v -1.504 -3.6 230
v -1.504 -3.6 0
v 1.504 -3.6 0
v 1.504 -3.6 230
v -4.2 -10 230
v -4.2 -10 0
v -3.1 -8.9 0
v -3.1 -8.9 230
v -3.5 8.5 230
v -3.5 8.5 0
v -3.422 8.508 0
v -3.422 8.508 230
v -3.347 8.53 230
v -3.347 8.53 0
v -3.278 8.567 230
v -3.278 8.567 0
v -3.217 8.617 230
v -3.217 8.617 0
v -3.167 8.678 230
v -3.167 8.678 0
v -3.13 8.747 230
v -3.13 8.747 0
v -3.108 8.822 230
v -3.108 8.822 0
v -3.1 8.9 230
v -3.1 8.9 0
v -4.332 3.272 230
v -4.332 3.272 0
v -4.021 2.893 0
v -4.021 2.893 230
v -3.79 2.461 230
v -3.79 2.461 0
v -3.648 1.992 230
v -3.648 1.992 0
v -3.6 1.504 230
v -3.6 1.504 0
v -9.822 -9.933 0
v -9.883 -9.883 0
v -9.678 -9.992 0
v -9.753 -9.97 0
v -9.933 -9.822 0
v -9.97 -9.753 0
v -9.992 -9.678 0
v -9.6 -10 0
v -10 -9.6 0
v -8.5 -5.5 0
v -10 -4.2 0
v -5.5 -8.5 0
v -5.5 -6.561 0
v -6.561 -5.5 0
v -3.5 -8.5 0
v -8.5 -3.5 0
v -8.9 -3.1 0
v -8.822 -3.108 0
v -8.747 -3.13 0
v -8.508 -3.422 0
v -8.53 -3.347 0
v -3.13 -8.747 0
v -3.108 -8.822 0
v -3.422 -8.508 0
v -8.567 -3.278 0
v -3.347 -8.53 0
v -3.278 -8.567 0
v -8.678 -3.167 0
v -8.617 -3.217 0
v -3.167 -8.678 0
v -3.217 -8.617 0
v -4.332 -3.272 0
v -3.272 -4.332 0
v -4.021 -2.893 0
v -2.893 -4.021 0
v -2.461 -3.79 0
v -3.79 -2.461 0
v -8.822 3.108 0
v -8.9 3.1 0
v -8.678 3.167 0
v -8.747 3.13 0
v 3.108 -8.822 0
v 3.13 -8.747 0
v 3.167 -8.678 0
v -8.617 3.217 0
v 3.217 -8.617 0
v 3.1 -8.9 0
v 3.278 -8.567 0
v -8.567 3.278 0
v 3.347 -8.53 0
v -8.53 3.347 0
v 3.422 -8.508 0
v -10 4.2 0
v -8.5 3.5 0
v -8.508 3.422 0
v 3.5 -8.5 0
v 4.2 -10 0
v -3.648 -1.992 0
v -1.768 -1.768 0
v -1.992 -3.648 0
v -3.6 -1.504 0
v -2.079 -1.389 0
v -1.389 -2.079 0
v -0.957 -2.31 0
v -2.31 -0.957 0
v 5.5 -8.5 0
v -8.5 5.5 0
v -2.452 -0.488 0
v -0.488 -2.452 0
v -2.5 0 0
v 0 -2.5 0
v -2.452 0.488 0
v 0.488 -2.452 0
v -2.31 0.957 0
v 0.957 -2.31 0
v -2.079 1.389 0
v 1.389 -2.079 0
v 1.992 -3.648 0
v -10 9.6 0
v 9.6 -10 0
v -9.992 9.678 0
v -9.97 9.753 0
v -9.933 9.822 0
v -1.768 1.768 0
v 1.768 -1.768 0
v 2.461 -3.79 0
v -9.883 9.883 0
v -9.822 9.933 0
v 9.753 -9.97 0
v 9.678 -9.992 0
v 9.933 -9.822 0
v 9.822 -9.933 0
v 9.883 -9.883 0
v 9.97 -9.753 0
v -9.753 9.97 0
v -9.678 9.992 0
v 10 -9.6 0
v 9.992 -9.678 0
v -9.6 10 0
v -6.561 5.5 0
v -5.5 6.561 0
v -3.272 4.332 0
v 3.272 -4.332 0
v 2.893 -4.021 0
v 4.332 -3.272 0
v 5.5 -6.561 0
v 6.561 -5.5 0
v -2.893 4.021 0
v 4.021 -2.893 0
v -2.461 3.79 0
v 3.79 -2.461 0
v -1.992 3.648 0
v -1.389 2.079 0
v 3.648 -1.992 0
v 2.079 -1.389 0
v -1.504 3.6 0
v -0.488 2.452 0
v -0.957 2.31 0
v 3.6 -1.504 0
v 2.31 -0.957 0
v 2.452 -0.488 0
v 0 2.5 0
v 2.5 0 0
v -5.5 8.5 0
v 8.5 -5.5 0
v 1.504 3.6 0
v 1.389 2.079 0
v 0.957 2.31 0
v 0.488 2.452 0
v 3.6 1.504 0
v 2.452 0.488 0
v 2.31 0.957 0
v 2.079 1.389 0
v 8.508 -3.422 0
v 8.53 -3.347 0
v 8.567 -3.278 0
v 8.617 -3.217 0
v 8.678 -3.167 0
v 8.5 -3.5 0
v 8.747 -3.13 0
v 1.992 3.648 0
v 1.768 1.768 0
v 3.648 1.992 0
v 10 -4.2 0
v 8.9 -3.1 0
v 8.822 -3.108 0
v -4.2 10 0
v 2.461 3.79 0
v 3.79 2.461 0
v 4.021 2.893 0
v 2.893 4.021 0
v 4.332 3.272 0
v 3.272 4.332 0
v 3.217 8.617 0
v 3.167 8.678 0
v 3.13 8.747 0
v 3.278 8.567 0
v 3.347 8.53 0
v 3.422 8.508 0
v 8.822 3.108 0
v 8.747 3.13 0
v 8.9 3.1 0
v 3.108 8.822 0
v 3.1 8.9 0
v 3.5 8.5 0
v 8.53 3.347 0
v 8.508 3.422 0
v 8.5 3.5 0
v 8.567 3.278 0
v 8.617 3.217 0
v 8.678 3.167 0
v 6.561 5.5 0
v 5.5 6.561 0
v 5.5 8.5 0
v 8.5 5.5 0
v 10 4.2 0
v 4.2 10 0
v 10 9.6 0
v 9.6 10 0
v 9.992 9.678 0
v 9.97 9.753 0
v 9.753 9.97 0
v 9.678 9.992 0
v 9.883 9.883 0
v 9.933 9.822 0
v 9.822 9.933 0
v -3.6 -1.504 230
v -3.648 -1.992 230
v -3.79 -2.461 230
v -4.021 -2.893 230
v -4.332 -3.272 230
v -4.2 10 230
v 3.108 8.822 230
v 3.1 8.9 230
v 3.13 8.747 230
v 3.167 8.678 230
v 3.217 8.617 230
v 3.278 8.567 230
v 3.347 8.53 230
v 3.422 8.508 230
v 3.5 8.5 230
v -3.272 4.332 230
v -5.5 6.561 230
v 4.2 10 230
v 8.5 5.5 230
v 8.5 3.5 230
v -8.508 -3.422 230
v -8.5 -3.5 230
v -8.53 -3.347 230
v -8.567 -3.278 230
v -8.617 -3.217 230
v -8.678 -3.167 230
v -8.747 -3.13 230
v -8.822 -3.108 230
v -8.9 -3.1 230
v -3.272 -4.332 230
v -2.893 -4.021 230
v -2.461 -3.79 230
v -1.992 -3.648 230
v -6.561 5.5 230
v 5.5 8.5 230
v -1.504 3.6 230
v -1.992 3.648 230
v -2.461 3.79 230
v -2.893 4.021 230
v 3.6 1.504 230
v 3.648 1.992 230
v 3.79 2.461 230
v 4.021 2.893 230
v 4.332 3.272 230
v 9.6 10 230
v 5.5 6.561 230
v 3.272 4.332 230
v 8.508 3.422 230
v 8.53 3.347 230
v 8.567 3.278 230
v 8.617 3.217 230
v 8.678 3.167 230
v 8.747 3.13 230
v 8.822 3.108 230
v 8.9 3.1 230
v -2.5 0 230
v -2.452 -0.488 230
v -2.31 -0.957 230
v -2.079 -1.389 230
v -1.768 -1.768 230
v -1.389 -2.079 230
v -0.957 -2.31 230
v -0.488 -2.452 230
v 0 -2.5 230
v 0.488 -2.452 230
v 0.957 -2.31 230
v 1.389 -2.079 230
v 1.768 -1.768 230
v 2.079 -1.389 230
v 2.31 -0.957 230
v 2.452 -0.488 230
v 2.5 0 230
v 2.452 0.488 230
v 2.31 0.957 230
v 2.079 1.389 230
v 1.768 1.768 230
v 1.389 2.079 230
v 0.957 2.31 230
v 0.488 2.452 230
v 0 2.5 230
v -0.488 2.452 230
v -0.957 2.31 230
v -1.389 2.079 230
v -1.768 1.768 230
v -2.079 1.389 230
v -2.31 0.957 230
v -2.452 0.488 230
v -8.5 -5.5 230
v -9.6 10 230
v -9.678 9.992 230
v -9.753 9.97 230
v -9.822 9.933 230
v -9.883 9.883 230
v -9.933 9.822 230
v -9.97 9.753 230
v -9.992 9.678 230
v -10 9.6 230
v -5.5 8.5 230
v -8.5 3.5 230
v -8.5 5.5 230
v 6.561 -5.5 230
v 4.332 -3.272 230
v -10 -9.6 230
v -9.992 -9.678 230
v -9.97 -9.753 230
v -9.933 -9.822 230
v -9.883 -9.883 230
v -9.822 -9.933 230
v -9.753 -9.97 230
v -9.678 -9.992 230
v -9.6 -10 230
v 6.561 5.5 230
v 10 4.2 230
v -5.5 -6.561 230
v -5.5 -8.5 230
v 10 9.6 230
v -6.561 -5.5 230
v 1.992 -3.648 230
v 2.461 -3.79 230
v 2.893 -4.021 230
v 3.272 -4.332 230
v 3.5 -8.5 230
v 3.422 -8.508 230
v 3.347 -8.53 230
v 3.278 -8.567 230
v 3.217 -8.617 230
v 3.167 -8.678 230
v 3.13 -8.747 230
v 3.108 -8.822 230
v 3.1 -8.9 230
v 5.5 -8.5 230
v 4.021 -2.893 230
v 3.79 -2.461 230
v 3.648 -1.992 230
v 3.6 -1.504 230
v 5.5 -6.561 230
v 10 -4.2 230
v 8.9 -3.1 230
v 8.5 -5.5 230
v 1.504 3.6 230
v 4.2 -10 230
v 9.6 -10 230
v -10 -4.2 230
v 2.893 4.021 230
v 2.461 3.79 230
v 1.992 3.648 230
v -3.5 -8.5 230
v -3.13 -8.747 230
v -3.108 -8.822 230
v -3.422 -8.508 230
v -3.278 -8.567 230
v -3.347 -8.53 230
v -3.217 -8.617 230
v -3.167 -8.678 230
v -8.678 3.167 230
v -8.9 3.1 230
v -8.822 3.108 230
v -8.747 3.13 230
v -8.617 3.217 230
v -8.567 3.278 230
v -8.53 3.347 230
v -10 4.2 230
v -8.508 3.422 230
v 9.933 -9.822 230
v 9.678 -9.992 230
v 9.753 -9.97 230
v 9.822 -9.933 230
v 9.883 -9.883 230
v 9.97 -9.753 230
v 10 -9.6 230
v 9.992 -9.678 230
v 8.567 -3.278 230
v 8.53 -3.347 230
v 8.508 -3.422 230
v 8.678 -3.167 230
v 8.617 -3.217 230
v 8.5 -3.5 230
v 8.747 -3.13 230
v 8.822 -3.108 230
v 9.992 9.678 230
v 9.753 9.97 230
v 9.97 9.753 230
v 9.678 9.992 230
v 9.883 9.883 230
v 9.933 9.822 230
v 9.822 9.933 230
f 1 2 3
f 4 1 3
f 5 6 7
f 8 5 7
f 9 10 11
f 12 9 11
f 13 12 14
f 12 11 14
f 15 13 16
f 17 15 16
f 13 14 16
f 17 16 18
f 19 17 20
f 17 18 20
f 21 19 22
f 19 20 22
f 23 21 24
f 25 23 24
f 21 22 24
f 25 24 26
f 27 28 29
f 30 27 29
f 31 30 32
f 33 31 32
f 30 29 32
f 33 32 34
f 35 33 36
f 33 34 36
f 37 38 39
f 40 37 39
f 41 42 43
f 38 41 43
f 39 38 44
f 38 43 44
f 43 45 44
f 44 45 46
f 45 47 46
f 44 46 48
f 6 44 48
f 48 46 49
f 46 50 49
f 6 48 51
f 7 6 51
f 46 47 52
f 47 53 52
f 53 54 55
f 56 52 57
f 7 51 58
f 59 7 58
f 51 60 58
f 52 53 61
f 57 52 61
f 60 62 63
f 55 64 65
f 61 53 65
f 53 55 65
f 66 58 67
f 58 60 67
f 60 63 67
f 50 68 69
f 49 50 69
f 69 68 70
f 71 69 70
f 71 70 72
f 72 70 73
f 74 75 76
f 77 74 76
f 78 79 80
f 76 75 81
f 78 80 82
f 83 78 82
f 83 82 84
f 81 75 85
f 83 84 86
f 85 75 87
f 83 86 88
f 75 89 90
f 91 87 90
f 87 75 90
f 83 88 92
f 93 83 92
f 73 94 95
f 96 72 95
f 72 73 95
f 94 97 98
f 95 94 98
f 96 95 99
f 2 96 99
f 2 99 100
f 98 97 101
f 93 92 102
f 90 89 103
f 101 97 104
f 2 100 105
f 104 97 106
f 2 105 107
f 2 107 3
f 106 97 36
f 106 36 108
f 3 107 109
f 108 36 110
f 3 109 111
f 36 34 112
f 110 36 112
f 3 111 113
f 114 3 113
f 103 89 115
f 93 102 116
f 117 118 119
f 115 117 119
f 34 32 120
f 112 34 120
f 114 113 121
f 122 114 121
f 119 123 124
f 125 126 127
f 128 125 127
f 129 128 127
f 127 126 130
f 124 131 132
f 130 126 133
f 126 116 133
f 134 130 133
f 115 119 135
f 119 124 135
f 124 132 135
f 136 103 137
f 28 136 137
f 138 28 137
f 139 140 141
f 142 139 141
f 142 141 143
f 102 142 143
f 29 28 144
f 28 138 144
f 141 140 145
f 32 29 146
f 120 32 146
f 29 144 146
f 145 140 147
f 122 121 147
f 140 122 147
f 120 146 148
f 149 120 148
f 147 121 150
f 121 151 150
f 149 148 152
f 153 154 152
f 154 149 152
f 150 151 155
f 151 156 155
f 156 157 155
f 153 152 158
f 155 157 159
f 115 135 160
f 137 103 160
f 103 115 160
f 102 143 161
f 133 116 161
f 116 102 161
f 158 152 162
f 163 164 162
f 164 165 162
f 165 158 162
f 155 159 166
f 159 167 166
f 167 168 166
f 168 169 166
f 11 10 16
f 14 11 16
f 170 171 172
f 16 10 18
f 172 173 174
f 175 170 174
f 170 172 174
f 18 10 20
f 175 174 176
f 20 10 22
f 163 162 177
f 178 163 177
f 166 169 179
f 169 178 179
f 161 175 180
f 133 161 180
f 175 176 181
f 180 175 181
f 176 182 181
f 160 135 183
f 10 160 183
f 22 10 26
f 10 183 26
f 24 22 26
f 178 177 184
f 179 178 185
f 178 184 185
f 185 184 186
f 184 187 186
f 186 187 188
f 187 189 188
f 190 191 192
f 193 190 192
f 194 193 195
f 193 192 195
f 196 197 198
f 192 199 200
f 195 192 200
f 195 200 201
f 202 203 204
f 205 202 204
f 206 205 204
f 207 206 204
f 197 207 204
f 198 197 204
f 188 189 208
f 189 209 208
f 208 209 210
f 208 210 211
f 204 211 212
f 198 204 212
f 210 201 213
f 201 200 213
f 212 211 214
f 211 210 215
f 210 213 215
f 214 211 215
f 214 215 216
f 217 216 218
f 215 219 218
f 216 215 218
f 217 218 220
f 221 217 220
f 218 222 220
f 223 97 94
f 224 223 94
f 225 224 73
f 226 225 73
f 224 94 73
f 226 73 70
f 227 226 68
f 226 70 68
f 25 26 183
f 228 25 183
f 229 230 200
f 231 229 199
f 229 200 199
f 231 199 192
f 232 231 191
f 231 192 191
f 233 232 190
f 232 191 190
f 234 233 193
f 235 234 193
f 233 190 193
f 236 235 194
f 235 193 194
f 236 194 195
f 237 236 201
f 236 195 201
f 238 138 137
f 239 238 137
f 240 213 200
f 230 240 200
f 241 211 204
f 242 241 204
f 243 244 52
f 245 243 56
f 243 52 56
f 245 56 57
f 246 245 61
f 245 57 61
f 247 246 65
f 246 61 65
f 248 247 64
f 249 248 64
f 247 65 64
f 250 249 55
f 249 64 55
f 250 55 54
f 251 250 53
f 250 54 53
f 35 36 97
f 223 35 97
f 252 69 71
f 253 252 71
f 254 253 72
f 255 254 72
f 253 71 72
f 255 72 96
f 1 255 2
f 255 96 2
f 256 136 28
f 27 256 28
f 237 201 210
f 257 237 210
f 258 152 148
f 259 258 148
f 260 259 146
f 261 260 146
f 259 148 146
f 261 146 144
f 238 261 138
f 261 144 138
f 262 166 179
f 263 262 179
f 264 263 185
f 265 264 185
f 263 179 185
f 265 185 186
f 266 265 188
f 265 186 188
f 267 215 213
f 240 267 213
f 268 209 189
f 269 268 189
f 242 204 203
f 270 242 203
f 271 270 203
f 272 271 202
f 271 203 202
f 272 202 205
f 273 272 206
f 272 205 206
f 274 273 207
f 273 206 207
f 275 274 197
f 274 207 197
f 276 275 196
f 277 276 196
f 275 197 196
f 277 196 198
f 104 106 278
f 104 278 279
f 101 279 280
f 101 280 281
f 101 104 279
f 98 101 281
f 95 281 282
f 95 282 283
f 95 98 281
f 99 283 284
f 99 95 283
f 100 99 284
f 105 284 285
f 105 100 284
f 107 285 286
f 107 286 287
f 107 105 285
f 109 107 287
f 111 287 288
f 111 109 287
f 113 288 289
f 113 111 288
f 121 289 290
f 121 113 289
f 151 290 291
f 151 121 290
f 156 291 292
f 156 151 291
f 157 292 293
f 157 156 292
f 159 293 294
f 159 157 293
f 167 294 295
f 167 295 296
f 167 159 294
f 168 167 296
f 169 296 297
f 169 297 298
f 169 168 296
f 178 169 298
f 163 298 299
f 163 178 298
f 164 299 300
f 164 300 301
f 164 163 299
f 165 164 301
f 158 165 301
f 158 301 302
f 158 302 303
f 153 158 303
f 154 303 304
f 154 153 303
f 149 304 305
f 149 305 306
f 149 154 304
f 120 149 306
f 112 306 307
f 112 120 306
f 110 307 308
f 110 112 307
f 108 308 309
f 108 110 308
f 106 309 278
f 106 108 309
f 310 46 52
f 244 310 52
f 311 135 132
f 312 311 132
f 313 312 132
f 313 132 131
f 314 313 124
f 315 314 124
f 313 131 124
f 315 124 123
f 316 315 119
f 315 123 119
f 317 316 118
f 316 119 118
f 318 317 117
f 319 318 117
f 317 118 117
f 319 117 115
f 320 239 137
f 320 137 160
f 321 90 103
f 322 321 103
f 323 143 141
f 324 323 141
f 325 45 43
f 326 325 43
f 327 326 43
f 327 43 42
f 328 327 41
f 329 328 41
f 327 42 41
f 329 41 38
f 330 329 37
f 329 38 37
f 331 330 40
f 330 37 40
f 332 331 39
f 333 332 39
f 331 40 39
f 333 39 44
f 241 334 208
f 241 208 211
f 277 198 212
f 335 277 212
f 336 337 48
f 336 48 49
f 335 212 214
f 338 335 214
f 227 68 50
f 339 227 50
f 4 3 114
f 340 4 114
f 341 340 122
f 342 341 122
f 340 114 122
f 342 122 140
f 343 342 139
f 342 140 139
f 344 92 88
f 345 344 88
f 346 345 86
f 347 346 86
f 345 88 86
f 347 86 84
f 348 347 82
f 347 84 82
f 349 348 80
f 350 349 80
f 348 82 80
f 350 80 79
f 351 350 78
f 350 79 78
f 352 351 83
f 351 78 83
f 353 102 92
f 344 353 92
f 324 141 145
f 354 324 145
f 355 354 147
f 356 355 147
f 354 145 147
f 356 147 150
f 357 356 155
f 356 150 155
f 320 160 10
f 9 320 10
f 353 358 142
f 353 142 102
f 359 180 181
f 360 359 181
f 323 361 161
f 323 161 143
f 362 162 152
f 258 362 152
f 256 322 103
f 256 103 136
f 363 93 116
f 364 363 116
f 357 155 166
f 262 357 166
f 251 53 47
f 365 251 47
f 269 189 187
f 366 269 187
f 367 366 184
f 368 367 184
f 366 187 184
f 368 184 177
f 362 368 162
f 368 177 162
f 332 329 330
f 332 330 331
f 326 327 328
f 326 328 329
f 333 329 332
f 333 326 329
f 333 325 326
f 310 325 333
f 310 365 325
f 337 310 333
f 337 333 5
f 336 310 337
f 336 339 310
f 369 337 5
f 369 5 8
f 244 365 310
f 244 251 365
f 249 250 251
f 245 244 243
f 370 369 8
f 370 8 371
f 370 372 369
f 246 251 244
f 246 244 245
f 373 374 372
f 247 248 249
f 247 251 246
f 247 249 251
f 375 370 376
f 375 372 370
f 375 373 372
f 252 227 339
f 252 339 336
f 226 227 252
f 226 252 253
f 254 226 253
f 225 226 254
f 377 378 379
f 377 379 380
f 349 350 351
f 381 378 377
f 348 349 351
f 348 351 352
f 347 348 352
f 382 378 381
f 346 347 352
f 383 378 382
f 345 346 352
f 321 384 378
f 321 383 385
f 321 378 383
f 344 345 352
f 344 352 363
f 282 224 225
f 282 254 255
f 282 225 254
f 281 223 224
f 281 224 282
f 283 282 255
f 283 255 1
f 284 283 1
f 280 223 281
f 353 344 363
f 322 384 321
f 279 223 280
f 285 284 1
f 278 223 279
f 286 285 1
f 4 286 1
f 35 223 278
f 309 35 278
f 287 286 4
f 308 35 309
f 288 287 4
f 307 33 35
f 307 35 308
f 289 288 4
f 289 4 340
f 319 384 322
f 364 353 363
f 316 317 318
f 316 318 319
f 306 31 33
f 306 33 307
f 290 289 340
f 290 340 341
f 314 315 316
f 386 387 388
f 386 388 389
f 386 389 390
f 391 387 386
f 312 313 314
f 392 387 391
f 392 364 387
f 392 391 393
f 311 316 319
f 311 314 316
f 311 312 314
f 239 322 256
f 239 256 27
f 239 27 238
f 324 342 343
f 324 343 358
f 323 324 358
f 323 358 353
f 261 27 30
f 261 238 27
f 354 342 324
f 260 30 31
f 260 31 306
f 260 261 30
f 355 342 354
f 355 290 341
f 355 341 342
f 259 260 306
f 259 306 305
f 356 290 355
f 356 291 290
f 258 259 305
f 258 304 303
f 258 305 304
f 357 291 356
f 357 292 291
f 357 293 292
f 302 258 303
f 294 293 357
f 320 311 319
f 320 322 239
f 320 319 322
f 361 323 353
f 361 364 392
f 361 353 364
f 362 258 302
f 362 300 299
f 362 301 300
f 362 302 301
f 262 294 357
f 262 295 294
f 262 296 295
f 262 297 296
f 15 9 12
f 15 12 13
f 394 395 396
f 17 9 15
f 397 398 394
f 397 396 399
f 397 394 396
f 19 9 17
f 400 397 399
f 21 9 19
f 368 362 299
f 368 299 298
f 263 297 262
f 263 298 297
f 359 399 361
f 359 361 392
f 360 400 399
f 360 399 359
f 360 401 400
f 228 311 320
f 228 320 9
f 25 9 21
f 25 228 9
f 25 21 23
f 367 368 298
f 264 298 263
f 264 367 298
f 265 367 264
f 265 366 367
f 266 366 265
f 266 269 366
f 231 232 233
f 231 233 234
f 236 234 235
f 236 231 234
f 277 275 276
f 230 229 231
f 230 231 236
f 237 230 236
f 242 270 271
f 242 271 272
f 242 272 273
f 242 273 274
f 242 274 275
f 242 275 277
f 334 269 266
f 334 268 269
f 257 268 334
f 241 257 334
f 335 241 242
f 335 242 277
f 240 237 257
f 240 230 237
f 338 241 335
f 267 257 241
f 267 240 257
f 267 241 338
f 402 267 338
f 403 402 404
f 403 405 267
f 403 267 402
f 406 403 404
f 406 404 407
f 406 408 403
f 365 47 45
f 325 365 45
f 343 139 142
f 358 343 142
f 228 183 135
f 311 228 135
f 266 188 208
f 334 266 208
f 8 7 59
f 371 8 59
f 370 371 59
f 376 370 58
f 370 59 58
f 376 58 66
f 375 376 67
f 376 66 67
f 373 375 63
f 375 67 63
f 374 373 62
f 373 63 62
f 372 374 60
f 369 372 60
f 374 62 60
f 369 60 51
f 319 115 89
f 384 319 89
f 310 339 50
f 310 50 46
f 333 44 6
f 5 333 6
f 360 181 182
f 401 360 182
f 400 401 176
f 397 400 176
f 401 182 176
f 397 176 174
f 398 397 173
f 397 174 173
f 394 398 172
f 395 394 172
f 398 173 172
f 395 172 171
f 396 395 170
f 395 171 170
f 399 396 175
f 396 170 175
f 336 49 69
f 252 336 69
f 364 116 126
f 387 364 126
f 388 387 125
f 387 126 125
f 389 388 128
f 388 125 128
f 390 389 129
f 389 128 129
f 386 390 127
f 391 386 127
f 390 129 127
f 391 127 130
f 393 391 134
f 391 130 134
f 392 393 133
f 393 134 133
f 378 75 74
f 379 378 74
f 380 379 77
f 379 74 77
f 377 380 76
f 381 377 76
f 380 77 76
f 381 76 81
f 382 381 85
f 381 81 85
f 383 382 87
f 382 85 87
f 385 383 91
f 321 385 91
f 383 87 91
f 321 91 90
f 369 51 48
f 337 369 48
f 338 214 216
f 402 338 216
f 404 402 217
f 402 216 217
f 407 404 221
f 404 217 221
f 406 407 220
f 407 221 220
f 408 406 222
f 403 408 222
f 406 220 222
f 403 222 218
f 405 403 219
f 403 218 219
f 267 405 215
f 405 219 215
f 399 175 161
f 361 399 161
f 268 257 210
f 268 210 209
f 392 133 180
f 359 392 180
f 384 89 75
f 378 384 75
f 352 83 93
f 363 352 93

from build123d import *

# Parameters (mm, degrees)
BOSS_EXTRU_1_DEPTH = 230


with BuildPart() as part:
    # Esquisse1 → Boss.-Extru.1 (new body)
    with BuildSketch(Plane.XY):
        with BuildLine():
            Line((-3.1, 8.9), (-4.2, 10))
            Line((-4.2, 10), (-9.6, 10))
            ThreePointArc((-9.6, 10), (-9.882842712, 9.882842712), (-10, 9.6))
            Line((-10, 9.6), (-10, 4.2))
            Line((-10, 4.2), (-8.9, 3.1))
            ThreePointArc((-8.9, 3.1), (-8.617157287, 3.217157287), (-8.5, 3.5))
            Line((-8.5, 3.5), (-8.5, 5.5))
            Line((-8.5, 5.5), (-6.560660172, 5.5))
            Line((-6.560660172, 5.5), (-4.332233047, 3.271572875))
            ThreePointArc((-4.332233047, 3.271572875), (-3.790301169, 2.460514503), (-3.6, 1.503805922))
            Line((-3.6, 1.503805922), (-3.6, 0))
            Line((-3.6, 0), (-3.6, -1.503805922))
            ThreePointArc((-3.6, -1.503805922), (-3.790301169, -2.460514503), (-4.332233047, -3.271572875))
            Line((-4.332233047, -3.271572875), (-6.560660172, -5.5))
            Line((-6.560660172, -5.5), (-8.5, -5.5))
            Line((-8.5, -5.5), (-8.5, -3.5))
            ThreePointArc((-8.5, -3.5), (-8.617157287, -3.217157288), (-8.9, -3.1))
            Line((-8.9, -3.1), (-10, -4.2))
            Line((-10, -4.2), (-10, -9.6))
            ThreePointArc((-10, -9.6), (-9.882842712, -9.882842712), (-9.6, -10))
            Line((-9.6, -10), (-4.2, -10))
            Line((-4.2, -10), (-3.1, -8.9))
            ThreePointArc((-3.1, -8.9), (-3.217157287, -8.617157288), (-3.5, -8.5))
            Line((-3.5, -8.5), (-5.5, -8.5))
            Line((-5.5, -8.5), (-5.5, -6.560660172))
            Line((-5.5, -6.560660172), (-3.271572875, -4.332233047))
            ThreePointArc((-3.271572875, -4.332233047), (-2.460514503, -3.790301169), (-1.503805922, -3.6))
            Line((-1.503805922, -3.6), (1.503805922, -3.6))
            ThreePointArc((1.503805922, -3.6), (2.460514503, -3.790301169), (3.271572875, -4.332233047))
            Line((3.271572875, -4.332233047), (5.5, -6.560660172))
            Line((5.5, -6.560660172), (5.5, -8.5))
            Line((5.5, -8.5), (3.5, -8.5))
            ThreePointArc((3.5, -8.5), (3.217157288, -8.617157288), (3.1, -8.9))
            Line((3.1, -8.9), (4.2, -10))
            Line((4.2, -10), (9.6, -10))
            ThreePointArc((9.6, -10), (9.882842713, -9.882842712), (10, -9.6))
            Line((10, -9.6), (10, -4.2))
            Line((10, -4.2), (8.9, -3.1))
            ThreePointArc((8.9, -3.1), (8.617157288, -3.217157288), (8.5, -3.5))
            Line((8.5, -3.5), (8.5, -5.5))
            Line((8.5, -5.5), (6.560660172, -5.5))
            Line((6.560660172, -5.5), (4.332233047, -3.271572875))
            ThreePointArc((4.332233047, -3.271572875), (3.790301169, -2.460514503), (3.6, -1.503805922))
            Line((3.6, -1.503805922), (3.6, 0))
            Line((3.6, 0), (3.6, 1.503805922))
            ThreePointArc((3.6, 1.503805922), (3.790301169, 2.460514503), (4.332233047, 3.271572875))
            Line((4.332233047, 3.271572875), (6.560660172, 5.5))
            Line((6.560660172, 5.5), (8.5, 5.5))
            Line((8.5, 5.5), (8.5, 3.5))
            ThreePointArc((8.5, 3.5), (8.617157288, 3.217157287), (8.9, 3.1))
            Line((8.9, 3.1), (10, 4.2))
            Line((10, 4.2), (10, 9.6))
            ThreePointArc((10, 9.6), (9.882842713, 9.882842712), (9.6, 10))
            Line((9.6, 10), (4.2, 10))
            Line((4.2, 10), (3.1, 8.9))
            ThreePointArc((3.1, 8.9), (3.217157288, 8.617157287), (3.5, 8.5))
            Line((3.5, 8.5), (5.5, 8.5))
            Line((5.5, 8.5), (5.5, 6.560660172))
            Line((5.5, 6.560660172), (3.271572875, 4.332233047))
            ThreePointArc((3.271572875, 4.332233047), (2.460514503, 3.790301169), (1.503805922, 3.6))
            Line((1.503805922, 3.6), (-1.503805922, 3.6))
            ThreePointArc((-1.503805922, 3.6), (-2.460514503, 3.790301169), (-3.271572875, 4.332233047))
            Line((-3.271572875, 4.332233047), (-5.5, 6.560660172))
            Line((-5.5, 6.560660172), (-5.5, 8.5))
            Line((-5.5, 8.5), (-3.5, 8.5))
            ThreePointArc((-3.5, 8.5), (-3.217157287, 8.617157287), (-3.1, 8.9))
        make_face()
        with BuildLine():
            ThreePointArc((2.5, 0), (0, 2.5), (-2.5, 0))
            ThreePointArc((-2.5, 0), (0, -2.5), (2.5, 0))
        make_face(mode=Mode.SUBTRACT)
    extrude(amount=BOSS_EXTRU_1_DEPTH)


solid = part.part
